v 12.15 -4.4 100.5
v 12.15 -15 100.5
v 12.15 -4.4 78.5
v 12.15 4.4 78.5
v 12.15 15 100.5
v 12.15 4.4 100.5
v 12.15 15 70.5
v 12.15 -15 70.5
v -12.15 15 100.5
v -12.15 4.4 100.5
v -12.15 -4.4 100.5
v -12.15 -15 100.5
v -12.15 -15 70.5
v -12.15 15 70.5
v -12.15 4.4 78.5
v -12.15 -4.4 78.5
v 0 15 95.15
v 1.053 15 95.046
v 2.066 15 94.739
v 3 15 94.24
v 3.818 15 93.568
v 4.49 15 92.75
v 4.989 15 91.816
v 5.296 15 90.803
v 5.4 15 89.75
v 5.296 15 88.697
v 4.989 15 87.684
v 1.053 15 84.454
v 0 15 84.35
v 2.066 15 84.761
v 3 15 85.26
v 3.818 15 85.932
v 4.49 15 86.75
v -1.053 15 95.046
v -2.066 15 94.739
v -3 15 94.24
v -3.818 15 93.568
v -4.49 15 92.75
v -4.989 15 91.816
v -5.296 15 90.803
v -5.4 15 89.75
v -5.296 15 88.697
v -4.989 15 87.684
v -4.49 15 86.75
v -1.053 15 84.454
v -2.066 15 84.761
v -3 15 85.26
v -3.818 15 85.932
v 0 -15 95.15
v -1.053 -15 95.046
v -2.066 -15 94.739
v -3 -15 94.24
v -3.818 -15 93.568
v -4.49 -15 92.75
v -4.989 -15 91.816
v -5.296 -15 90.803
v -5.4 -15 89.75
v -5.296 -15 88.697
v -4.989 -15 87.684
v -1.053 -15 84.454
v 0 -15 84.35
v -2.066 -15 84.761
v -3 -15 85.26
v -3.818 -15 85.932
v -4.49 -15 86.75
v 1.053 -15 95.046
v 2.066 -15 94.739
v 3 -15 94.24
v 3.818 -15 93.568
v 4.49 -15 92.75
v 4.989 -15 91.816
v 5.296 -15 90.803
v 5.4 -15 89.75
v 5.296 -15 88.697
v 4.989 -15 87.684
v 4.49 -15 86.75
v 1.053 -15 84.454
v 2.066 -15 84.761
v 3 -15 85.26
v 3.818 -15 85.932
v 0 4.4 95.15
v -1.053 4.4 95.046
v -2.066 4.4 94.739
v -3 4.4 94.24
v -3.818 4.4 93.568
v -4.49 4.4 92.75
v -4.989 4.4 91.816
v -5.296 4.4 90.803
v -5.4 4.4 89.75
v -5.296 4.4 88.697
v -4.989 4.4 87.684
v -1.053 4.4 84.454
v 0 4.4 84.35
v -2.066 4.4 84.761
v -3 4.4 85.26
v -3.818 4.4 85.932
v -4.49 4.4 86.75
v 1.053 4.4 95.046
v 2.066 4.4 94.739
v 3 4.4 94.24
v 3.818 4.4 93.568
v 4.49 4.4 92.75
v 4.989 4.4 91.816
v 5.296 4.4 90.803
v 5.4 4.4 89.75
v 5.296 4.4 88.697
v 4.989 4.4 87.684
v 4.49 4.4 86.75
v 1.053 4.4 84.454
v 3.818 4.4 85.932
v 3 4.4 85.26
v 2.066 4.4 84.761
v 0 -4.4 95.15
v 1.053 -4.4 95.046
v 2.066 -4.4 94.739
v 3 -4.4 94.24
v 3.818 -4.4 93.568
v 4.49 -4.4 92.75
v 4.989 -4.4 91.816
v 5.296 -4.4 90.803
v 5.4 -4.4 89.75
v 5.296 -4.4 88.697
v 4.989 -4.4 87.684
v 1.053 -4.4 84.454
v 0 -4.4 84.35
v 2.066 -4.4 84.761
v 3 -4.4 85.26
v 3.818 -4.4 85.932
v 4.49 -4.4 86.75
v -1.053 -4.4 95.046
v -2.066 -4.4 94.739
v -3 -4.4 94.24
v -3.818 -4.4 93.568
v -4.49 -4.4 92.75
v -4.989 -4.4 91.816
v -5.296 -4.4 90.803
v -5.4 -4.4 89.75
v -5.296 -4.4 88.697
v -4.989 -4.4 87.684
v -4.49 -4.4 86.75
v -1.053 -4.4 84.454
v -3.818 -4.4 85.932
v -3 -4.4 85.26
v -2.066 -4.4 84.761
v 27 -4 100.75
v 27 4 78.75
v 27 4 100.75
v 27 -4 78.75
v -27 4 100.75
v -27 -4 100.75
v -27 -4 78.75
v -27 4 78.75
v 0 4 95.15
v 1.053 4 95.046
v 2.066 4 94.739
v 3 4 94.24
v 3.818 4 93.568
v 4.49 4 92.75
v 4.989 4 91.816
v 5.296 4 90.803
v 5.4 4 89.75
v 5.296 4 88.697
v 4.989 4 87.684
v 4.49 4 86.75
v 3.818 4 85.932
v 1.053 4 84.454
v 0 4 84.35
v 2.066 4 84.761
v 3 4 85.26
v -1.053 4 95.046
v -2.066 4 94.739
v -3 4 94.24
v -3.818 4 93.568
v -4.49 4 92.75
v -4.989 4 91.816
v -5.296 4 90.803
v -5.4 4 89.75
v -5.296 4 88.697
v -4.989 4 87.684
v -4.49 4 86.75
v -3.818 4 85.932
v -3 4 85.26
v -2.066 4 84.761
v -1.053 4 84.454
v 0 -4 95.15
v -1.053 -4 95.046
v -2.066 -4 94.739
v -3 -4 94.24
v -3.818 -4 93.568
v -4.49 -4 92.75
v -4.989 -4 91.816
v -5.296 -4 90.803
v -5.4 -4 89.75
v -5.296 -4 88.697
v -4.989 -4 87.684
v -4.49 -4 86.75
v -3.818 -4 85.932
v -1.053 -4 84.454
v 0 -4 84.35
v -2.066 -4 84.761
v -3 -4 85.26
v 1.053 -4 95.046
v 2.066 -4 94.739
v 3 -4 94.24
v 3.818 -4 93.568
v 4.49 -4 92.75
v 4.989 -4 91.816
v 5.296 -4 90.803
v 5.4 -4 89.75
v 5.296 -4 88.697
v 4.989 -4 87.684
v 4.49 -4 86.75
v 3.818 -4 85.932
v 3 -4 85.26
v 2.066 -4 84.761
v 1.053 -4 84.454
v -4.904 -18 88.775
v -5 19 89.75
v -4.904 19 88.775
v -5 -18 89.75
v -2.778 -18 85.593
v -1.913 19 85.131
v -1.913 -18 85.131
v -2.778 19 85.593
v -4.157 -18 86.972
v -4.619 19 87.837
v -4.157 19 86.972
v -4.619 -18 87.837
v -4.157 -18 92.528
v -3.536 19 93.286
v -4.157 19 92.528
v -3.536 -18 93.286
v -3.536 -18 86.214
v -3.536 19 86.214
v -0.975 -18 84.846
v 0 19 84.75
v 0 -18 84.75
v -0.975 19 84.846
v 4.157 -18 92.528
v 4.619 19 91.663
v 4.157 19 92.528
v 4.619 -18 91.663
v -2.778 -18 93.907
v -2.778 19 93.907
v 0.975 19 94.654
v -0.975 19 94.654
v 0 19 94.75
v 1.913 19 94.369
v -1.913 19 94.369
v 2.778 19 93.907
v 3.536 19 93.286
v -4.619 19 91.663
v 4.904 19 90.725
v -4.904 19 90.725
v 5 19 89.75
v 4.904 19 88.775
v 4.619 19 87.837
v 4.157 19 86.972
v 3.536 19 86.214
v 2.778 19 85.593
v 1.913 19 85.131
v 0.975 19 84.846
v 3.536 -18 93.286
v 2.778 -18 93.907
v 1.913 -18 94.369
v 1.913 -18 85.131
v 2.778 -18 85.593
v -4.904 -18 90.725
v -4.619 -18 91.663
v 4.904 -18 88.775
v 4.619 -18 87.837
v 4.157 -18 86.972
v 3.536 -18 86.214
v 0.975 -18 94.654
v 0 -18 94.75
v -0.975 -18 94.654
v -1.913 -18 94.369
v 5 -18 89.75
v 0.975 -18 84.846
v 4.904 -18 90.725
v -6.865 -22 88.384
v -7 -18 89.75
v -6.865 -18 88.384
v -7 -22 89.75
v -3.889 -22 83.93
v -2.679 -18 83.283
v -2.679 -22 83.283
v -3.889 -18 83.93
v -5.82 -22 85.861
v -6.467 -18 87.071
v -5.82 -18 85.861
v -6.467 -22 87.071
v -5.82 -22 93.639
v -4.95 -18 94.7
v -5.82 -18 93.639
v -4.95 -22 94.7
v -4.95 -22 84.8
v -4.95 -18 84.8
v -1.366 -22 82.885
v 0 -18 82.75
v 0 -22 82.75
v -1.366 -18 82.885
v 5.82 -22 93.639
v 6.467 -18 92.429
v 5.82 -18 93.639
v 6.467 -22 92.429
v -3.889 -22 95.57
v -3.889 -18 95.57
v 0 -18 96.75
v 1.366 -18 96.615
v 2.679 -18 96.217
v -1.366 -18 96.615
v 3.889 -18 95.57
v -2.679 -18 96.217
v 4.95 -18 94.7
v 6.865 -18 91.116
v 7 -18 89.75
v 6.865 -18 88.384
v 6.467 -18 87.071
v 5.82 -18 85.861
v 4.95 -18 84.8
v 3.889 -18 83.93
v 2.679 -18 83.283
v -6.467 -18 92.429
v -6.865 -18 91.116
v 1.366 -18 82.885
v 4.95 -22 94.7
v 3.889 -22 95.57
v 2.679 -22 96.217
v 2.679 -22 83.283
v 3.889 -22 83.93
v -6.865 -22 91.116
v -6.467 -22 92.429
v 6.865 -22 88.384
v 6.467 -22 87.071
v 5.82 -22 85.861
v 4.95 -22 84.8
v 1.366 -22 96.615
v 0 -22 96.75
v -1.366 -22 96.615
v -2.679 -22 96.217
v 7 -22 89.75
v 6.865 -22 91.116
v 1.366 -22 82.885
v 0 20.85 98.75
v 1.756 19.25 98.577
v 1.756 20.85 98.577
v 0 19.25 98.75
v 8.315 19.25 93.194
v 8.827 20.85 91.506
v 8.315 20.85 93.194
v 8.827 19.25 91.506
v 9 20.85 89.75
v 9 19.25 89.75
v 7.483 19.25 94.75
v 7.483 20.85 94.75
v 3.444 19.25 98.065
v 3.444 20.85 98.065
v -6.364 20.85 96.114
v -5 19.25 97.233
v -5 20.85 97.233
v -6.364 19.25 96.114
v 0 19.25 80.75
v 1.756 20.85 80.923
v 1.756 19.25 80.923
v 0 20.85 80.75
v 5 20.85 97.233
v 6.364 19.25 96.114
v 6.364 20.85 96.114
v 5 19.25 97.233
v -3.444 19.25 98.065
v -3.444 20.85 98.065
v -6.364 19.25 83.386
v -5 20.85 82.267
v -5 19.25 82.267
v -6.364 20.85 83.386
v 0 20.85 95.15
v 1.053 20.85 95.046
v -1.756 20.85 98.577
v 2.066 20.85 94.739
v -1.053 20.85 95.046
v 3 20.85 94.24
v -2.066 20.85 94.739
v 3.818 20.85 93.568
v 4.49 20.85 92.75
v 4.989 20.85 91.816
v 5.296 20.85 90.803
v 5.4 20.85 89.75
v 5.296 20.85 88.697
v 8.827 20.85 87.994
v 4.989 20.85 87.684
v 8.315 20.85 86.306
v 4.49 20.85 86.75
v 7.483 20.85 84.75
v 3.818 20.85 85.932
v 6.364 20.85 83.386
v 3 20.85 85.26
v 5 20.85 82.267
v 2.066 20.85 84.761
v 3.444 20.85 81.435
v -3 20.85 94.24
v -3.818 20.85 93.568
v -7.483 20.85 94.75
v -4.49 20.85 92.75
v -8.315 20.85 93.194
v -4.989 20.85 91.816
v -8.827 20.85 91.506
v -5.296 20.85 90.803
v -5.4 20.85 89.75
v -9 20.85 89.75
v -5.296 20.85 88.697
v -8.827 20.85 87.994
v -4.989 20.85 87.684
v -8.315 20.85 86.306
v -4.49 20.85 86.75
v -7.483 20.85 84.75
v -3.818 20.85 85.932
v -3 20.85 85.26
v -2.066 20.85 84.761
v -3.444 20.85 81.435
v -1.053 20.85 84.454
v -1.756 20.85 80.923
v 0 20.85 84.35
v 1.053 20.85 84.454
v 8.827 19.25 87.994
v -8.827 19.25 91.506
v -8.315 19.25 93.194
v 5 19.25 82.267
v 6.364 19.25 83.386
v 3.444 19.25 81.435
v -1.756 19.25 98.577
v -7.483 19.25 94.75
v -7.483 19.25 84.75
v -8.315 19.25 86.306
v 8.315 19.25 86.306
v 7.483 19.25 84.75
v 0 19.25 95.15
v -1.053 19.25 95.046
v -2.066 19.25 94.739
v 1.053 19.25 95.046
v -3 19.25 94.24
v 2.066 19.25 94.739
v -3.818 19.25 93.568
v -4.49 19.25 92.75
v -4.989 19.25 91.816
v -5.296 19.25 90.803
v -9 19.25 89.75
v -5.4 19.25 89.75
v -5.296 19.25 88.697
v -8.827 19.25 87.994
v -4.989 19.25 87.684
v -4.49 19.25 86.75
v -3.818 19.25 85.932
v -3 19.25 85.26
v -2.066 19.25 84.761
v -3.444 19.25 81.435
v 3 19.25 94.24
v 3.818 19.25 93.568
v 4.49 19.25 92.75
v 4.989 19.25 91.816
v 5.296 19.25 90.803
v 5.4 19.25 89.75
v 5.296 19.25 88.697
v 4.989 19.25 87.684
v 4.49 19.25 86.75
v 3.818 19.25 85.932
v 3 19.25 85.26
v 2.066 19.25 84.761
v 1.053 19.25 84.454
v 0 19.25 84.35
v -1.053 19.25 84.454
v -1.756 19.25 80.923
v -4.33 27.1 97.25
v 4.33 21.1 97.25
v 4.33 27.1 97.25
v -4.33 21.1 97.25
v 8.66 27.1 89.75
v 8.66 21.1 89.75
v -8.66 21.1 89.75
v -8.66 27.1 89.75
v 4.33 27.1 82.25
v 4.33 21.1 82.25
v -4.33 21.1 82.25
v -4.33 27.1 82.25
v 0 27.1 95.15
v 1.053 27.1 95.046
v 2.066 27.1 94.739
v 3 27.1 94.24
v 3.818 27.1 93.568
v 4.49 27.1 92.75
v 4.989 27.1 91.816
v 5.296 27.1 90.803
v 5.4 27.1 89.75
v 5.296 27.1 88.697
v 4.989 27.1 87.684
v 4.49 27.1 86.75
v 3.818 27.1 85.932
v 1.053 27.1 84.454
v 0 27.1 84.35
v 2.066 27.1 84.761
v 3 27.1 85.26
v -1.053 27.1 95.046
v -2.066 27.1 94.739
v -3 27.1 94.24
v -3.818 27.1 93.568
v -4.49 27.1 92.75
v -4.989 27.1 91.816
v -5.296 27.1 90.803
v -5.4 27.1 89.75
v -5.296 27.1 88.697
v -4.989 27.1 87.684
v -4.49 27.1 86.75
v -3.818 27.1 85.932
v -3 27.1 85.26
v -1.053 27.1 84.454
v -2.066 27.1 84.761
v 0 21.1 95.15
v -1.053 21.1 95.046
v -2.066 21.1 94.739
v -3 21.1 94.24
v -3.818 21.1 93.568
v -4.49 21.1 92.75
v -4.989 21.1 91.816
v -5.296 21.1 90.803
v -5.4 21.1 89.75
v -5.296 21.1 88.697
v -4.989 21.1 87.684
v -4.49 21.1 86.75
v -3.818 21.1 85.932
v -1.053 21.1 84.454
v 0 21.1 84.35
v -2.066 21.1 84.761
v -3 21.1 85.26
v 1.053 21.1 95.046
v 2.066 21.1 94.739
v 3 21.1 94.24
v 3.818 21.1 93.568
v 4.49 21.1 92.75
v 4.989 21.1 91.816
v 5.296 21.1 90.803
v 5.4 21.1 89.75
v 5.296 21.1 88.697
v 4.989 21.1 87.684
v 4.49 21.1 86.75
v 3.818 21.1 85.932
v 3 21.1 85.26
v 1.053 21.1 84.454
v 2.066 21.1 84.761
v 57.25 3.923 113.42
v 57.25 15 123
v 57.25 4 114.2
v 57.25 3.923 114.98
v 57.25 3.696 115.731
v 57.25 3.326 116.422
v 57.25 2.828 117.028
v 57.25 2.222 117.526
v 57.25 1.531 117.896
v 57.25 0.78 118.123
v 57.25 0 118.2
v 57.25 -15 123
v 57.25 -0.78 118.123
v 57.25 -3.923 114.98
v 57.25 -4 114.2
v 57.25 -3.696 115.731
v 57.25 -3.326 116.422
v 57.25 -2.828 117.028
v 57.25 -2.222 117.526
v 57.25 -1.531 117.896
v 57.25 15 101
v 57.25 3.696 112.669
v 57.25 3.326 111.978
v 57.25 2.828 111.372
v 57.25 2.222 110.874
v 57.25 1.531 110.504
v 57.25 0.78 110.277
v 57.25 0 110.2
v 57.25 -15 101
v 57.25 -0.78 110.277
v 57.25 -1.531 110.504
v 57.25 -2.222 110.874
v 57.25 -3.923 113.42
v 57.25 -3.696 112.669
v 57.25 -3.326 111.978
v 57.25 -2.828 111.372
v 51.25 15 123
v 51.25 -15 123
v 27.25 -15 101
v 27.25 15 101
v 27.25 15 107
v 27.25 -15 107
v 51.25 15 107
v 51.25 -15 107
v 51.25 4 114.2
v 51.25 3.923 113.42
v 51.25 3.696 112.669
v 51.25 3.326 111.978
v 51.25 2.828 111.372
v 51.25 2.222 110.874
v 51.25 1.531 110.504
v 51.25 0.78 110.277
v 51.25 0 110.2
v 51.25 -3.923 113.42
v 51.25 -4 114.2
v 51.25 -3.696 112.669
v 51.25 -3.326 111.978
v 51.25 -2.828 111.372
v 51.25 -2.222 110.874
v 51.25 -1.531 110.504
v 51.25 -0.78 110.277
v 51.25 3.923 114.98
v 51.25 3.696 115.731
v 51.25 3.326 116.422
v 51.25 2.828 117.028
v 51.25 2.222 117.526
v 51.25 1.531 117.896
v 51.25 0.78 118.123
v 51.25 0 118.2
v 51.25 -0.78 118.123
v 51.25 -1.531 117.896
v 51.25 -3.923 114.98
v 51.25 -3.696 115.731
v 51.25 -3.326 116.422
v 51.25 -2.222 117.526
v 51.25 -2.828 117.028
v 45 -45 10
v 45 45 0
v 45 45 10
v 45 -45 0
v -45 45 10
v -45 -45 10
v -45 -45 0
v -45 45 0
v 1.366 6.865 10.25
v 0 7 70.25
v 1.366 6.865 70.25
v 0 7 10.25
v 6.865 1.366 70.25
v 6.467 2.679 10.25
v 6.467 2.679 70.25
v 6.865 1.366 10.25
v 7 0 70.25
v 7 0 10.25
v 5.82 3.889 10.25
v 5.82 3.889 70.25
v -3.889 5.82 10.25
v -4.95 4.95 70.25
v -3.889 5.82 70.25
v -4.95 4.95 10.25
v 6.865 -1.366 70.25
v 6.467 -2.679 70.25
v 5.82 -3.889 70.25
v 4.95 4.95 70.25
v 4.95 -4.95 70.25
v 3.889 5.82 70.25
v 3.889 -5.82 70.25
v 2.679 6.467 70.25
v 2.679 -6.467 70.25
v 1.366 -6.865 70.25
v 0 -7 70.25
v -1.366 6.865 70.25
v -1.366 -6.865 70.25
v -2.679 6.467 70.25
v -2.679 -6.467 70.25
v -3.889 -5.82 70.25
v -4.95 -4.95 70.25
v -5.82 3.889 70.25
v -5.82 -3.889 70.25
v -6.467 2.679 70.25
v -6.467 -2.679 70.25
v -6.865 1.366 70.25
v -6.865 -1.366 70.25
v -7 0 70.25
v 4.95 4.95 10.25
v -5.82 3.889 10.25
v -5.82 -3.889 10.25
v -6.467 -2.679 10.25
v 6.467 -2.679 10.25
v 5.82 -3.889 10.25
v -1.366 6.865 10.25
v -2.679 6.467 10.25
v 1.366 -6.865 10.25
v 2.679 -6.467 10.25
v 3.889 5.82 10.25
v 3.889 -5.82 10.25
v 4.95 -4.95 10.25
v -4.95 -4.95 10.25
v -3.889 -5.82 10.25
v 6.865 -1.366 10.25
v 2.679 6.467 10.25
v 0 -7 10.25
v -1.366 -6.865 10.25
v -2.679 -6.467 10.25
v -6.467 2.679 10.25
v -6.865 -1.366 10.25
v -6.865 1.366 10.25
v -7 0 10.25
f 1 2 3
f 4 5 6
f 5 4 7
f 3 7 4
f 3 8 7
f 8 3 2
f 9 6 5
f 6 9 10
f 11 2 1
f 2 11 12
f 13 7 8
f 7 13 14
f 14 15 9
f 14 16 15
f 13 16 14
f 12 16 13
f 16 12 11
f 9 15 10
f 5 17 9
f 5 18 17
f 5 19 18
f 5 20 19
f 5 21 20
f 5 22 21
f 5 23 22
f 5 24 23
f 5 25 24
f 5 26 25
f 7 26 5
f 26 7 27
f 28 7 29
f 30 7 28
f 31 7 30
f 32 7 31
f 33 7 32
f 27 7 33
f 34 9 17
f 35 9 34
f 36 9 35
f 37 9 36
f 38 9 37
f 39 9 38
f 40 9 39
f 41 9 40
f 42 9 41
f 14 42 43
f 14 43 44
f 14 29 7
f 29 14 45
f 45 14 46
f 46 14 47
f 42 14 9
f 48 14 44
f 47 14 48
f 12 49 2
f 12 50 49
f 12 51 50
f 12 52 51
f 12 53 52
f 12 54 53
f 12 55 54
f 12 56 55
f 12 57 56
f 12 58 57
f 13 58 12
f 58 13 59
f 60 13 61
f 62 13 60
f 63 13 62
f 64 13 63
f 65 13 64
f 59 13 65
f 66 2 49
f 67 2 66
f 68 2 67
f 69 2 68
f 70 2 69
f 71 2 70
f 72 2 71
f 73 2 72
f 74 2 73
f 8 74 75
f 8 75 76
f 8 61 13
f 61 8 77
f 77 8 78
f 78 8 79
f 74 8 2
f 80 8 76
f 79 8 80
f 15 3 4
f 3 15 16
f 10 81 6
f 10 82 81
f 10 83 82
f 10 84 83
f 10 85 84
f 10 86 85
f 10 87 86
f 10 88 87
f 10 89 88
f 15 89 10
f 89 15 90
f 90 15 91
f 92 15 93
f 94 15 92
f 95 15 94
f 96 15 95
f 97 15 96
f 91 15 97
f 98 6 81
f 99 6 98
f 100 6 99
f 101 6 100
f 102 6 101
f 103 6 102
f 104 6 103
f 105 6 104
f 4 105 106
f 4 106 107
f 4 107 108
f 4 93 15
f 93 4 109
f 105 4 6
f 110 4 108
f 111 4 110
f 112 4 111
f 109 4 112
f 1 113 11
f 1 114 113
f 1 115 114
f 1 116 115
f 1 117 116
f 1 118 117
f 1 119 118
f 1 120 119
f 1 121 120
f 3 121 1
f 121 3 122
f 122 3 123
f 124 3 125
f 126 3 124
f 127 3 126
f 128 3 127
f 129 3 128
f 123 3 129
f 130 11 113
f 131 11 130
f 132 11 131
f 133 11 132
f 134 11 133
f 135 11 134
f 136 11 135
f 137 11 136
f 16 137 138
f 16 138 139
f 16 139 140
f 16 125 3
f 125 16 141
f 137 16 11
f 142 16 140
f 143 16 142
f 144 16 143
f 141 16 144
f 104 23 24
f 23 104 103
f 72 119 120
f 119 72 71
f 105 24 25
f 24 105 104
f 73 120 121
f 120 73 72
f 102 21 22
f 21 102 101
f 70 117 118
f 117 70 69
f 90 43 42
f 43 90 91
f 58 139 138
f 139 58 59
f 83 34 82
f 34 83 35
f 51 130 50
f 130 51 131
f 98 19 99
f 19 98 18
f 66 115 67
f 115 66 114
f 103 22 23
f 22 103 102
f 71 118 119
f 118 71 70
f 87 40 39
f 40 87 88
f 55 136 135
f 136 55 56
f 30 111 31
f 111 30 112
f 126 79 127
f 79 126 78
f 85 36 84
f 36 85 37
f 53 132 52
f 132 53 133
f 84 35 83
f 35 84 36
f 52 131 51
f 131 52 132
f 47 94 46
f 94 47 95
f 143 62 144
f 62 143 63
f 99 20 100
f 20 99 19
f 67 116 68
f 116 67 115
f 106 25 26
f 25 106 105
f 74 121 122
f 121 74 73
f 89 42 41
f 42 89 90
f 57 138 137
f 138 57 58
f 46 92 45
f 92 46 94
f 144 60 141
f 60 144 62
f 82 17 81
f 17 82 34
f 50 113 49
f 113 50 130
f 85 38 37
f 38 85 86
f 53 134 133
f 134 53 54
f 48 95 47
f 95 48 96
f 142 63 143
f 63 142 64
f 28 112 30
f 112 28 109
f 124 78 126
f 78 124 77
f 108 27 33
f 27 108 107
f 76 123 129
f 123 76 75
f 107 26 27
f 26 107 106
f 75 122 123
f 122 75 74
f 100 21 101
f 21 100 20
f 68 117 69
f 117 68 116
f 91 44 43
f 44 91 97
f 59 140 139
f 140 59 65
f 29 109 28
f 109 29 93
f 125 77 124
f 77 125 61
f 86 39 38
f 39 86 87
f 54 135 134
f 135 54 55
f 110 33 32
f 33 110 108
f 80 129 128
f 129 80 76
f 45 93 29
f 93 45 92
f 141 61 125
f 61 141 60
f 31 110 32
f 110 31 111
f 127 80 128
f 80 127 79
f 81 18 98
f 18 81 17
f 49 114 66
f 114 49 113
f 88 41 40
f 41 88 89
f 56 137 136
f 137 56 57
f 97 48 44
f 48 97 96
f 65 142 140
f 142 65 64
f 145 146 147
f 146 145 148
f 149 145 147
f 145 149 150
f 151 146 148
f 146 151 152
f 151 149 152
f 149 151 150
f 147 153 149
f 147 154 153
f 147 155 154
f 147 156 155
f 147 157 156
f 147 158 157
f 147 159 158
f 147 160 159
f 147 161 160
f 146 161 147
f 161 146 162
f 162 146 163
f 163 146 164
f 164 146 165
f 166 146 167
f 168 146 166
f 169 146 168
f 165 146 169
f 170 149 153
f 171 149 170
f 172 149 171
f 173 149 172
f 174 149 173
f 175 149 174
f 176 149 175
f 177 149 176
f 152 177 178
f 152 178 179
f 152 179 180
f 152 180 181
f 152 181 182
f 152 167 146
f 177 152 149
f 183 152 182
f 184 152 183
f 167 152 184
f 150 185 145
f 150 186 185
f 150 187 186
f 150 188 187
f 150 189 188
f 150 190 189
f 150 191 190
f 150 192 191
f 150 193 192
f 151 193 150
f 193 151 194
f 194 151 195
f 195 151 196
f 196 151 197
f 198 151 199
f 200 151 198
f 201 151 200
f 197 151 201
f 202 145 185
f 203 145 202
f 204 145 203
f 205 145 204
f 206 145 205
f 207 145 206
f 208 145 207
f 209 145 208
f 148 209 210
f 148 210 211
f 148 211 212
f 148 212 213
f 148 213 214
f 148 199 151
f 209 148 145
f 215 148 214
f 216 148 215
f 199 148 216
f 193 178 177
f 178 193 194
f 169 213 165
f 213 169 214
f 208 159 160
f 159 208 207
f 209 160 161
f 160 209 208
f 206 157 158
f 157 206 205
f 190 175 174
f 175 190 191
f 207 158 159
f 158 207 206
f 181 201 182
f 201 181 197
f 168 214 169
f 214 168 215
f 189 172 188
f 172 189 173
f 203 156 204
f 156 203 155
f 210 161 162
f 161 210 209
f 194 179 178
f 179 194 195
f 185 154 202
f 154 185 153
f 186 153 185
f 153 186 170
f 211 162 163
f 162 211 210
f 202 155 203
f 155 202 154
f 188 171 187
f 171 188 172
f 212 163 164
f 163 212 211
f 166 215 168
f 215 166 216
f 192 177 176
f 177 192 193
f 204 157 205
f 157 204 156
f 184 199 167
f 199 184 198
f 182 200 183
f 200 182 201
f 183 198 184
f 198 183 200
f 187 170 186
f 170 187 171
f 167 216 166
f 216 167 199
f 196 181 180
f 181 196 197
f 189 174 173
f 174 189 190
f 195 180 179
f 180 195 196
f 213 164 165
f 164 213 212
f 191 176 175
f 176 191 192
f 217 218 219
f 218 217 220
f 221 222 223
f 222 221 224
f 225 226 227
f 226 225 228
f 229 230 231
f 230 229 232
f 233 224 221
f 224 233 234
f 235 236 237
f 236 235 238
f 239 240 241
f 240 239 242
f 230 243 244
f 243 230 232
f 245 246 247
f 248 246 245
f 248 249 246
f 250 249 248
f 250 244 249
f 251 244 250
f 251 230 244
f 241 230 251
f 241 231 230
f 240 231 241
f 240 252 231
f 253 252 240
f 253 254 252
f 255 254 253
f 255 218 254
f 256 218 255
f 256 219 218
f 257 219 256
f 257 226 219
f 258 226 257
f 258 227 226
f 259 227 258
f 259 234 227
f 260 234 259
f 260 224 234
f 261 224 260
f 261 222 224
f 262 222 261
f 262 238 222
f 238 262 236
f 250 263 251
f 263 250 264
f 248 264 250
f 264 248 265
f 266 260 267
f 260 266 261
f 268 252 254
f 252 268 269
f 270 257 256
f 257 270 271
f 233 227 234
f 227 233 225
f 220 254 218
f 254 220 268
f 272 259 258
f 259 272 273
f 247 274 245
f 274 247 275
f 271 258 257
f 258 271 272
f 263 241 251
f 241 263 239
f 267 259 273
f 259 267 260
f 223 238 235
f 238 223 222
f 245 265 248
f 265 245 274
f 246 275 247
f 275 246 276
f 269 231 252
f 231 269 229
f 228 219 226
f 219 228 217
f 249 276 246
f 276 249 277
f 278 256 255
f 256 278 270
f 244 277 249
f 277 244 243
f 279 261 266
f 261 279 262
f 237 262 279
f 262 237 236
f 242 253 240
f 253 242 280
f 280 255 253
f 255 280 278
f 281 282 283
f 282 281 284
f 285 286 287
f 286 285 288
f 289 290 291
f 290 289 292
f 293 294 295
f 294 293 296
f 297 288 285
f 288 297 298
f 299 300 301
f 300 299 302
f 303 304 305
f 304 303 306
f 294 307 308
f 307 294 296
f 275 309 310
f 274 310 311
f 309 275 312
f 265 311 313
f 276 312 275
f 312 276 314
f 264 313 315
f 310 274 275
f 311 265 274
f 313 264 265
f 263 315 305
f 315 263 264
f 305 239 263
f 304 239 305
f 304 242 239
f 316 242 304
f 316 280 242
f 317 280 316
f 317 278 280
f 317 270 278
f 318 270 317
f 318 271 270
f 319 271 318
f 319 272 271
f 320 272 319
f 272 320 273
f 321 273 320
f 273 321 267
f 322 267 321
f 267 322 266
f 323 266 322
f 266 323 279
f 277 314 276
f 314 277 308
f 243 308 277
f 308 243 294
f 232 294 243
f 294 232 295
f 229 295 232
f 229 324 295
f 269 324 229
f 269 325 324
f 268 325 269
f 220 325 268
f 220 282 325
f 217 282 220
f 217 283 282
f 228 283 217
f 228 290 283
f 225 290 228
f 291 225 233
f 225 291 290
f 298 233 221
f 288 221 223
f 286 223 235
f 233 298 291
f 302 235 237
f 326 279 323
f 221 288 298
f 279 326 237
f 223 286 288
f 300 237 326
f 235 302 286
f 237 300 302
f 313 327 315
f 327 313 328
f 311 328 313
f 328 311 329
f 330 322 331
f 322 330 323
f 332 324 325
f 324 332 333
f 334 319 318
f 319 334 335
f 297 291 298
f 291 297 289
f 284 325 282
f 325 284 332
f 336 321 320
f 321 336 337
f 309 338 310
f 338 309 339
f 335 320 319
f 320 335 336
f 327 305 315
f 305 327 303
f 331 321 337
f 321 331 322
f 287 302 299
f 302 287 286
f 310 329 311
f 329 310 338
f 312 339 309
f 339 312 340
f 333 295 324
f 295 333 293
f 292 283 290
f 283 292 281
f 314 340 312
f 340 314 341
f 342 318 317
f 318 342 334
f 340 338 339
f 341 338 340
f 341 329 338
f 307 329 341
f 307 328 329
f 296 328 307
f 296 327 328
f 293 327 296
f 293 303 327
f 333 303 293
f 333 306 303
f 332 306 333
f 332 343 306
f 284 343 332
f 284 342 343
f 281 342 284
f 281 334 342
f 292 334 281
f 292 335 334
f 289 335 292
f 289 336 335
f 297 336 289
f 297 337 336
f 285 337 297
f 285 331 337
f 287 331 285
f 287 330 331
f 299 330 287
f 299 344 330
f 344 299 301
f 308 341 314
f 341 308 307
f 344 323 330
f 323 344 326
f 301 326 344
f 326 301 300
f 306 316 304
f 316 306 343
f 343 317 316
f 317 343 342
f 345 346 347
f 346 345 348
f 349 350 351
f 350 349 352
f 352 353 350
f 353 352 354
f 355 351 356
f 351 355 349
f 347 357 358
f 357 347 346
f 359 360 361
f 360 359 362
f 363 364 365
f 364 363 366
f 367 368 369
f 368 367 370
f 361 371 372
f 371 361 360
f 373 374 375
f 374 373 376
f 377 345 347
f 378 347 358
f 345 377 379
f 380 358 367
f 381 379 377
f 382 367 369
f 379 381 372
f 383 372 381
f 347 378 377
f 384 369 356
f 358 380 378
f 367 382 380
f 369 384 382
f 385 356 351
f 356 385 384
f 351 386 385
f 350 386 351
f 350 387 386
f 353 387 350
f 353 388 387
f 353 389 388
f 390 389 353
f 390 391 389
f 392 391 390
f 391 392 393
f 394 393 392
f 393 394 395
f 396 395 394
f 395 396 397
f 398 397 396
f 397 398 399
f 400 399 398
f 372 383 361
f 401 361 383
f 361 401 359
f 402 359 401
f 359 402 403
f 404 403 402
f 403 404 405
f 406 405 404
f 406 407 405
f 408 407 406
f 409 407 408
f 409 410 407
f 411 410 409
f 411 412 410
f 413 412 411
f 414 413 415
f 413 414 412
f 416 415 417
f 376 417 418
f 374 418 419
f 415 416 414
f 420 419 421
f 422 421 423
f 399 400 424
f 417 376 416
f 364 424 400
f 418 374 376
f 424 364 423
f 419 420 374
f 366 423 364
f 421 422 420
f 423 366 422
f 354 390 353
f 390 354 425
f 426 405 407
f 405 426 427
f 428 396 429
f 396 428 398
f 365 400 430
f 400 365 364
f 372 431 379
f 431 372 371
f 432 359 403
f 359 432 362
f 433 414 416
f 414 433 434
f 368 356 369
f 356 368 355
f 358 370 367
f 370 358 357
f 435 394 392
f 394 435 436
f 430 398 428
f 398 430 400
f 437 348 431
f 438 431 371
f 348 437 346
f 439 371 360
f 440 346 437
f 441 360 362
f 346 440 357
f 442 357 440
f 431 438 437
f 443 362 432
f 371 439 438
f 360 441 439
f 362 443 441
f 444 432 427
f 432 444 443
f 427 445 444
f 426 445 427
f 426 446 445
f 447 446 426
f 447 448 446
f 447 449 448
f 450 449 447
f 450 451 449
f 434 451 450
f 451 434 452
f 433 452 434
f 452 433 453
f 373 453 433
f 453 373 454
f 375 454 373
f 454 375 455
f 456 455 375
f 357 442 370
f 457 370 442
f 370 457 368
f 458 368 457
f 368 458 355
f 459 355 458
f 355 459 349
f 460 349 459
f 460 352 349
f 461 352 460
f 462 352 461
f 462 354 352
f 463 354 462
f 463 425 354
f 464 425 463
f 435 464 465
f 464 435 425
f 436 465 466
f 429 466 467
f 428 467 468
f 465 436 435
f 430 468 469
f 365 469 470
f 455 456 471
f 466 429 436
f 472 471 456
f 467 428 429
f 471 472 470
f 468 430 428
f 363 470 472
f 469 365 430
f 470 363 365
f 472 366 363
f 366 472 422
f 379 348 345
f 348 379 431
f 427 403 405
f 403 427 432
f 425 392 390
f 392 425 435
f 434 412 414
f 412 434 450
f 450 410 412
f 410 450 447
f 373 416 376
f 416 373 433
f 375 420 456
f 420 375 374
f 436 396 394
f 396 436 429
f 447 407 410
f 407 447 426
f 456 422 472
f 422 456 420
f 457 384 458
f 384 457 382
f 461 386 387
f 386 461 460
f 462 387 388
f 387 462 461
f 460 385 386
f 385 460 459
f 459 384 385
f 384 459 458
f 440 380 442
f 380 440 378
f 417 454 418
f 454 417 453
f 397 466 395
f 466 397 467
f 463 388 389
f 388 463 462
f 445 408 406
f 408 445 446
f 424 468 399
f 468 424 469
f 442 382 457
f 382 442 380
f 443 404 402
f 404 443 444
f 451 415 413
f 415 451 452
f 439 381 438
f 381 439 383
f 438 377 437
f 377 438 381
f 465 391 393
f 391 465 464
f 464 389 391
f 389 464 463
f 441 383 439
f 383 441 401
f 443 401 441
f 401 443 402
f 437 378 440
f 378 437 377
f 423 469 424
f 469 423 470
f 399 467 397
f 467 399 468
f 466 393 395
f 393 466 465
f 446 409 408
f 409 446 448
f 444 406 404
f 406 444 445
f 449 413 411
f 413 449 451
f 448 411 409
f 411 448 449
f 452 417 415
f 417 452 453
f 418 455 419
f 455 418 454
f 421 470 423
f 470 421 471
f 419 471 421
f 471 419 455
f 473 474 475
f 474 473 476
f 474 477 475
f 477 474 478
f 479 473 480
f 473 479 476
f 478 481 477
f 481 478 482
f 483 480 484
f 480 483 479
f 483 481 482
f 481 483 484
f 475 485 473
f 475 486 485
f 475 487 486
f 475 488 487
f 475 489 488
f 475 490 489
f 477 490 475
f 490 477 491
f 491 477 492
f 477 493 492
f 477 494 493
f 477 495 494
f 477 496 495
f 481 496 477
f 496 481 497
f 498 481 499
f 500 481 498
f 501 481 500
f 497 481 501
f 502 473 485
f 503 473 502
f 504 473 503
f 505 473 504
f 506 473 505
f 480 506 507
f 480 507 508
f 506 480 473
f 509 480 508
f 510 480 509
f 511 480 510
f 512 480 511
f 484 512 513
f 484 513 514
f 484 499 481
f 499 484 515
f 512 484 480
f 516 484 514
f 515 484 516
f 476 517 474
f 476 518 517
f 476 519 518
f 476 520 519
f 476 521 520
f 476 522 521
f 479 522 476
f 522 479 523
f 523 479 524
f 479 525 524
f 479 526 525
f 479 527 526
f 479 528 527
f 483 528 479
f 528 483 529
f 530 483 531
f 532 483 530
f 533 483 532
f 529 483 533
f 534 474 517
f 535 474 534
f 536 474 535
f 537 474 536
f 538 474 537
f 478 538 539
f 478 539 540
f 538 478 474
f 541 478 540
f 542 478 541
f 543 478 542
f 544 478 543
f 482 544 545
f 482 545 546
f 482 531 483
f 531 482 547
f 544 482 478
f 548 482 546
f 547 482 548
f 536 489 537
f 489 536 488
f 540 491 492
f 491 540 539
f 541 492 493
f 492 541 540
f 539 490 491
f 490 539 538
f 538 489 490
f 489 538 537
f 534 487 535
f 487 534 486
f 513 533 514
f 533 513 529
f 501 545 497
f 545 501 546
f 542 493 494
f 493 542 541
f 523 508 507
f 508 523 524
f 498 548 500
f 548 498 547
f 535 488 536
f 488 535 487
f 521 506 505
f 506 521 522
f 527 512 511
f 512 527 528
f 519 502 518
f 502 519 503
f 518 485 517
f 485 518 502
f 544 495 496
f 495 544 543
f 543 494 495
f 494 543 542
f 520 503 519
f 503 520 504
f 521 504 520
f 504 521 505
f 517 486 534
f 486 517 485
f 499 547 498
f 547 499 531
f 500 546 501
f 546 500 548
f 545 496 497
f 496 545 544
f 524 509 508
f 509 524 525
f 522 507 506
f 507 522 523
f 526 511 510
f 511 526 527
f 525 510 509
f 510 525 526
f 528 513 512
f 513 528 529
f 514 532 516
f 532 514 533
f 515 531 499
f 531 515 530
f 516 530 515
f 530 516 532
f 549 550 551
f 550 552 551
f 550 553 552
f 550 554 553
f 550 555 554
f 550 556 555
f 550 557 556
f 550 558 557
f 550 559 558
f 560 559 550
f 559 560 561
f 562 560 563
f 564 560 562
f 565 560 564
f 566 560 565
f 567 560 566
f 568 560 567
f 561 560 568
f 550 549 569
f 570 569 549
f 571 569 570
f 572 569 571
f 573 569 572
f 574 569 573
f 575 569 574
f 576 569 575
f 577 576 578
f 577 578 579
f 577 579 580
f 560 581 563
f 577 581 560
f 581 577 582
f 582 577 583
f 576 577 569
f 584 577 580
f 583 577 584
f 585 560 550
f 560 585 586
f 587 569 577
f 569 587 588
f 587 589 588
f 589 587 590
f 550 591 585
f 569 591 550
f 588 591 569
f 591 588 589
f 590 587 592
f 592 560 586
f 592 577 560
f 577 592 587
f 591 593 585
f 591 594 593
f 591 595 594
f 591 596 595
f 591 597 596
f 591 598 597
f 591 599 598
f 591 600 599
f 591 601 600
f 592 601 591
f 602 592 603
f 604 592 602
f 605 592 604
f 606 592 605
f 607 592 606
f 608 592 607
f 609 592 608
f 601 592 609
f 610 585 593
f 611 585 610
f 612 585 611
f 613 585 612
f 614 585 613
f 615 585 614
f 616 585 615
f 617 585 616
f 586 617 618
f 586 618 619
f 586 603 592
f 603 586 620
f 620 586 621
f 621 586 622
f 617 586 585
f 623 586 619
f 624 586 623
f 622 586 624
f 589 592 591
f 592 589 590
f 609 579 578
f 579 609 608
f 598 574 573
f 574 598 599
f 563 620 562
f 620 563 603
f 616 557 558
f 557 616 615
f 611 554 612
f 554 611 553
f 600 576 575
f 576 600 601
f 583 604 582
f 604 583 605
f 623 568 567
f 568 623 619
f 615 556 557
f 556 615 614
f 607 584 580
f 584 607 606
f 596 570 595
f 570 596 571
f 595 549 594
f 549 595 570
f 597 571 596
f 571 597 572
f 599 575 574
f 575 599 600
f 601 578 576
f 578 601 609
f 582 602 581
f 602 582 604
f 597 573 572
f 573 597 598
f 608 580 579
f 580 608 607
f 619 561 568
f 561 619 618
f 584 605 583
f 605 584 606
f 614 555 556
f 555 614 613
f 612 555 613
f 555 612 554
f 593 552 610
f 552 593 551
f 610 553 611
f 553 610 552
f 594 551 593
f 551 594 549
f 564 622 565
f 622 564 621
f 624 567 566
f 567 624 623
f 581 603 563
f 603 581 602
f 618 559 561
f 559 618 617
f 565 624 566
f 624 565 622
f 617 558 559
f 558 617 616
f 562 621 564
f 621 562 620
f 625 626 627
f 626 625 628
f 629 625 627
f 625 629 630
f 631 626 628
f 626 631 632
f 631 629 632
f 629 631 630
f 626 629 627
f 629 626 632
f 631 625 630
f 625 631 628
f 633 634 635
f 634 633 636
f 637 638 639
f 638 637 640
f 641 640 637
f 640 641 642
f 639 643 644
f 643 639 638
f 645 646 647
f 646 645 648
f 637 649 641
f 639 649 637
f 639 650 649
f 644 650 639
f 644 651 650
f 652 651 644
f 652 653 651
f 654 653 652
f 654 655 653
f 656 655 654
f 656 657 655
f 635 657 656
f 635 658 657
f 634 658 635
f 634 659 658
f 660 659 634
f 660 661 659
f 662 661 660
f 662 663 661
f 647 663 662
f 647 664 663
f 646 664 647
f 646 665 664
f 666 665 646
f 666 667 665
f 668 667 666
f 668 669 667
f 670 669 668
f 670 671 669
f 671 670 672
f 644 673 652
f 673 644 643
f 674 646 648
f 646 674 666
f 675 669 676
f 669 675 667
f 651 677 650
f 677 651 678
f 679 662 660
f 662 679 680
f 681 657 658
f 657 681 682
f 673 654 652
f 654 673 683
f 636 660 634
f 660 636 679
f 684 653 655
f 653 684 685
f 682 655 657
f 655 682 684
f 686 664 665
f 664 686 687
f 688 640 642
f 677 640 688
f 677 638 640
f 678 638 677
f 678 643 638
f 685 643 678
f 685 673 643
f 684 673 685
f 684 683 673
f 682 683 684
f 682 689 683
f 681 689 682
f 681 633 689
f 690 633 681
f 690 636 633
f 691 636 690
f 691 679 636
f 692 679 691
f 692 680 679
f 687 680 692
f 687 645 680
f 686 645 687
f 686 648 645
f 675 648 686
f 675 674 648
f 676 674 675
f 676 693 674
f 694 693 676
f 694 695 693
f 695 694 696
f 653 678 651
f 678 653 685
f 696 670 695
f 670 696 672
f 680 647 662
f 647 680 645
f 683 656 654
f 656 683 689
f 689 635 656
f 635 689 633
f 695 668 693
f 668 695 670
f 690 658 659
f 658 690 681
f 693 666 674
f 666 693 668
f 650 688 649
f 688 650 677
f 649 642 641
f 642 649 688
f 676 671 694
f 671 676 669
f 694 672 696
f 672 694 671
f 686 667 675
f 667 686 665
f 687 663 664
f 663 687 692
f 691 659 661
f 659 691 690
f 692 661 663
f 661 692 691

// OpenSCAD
$fn = 32;

// ------------------------------------------------------------------------
// Lamp arm: column d14 x 60 mm, arm 54 mm
// Every part is its own module, assembly() places every instance.
// ------------------------------------------------------------------------

// --- part 1 ---
module lamp_base() {
  difference() {
    translate([-45, -45, 0]) cube([90, 90, 10]);
  }
}

// --- part 2 ---
module lamp_column() {
  cylinder(h = 60, d = 14);
}

// --- part 3 ---
module head_fork() {
  difference() {
    translate([-12.15, -15, 0]) cube([24.3, 30, 30]);
    translate([-13.15, -4.4, 8]) cube([26.3, 8.8, 23]);
    translate([0, 0, 19.25]) rotate([90, 0, 0]) cylinder(h = 32, d = 10.8, center = true);
  }
}

// --- part 4 ---
module lamp_arm() {
  difference() {
    translate([-27, -4, 0]) cube([54, 8, 22]);
    translate([0, 0, 11]) rotate([90, 0, 0]) cylinder(h = 10, d = 10.8, center = true);
  }
}

// --- part 5 ---
module arm_pin() {
  rotate([0, 90, 0]) cylinder(h = 38, d = 10, center = true);
  translate([-22, 0, 0]) rotate([0, 90, 0]) cylinder(h = 4, d = 14);
}

// --- part 6 ---
module arm_washer() {
  difference() {
      translate([0, 0, 0]) cylinder(h = 1.6, d = 18);
      translate([0, 0, -1]) cylinder(h = 3.6, d = 10.8);
    }
}

// --- part 7 ---
module arm_nut() {
  difference() {
    linear_extrude(height = 6) polygon(points = [[8.66, 0], [4.33, 7.5], [-4.33, 7.5], [-8.66, 0], [-4.33, -7.5], [4.33, -7.5]]);
    translate([0, 0, -1]) cylinder(h = 8, d = 10.8);
  }
}

// --- part 8 ---
module shade_bracket() {
  difference() {
    translate([-15, -15, 0]) cube([30, 30, 22]);
    translate([-16, -16, 6]) cube([25, 32, 17]);
    translate([12, 0, 13.2]) rotate([0, 90, 0]) cylinder(h = 8, d = 8, center = true);
  }
}

// --- assembly ---
module assembly() {
  color([0.80, 0.24, 0.20]) translate([0, 0, 0]) rotate([0, 0, 0]) lamp_base();
  color([0.20, 0.45, 0.75]) translate([0, 0, 10.25]) rotate([0, 0, 0]) lamp_column();
  color([0.25, 0.62, 0.32]) translate([0, 0, 70.5]) rotate([0, 0, 0]) head_fork();
  color([0.92, 0.70, 0.18]) translate([0, 0, 78.75]) rotate([0, 0, 0]) lamp_arm();
  color([0.58, 0.35, 0.70]) translate([0, 0, 89.75]) rotate([0, 0, 90]) arm_pin();
  color([0.16, 0.66, 0.66]) translate([0, 20.85, 89.75]) rotate([90, 0, 0]) arm_washer();
  color([0.85, 0.48, 0.18]) translate([0, 27.1, 89.75]) rotate([90, 0, 0]) arm_nut();
  color([0.55, 0.60, 0.65]) translate([42.25, 0, 101]) rotate([0, 0, 0]) shade_bracket();
}

assembly();
